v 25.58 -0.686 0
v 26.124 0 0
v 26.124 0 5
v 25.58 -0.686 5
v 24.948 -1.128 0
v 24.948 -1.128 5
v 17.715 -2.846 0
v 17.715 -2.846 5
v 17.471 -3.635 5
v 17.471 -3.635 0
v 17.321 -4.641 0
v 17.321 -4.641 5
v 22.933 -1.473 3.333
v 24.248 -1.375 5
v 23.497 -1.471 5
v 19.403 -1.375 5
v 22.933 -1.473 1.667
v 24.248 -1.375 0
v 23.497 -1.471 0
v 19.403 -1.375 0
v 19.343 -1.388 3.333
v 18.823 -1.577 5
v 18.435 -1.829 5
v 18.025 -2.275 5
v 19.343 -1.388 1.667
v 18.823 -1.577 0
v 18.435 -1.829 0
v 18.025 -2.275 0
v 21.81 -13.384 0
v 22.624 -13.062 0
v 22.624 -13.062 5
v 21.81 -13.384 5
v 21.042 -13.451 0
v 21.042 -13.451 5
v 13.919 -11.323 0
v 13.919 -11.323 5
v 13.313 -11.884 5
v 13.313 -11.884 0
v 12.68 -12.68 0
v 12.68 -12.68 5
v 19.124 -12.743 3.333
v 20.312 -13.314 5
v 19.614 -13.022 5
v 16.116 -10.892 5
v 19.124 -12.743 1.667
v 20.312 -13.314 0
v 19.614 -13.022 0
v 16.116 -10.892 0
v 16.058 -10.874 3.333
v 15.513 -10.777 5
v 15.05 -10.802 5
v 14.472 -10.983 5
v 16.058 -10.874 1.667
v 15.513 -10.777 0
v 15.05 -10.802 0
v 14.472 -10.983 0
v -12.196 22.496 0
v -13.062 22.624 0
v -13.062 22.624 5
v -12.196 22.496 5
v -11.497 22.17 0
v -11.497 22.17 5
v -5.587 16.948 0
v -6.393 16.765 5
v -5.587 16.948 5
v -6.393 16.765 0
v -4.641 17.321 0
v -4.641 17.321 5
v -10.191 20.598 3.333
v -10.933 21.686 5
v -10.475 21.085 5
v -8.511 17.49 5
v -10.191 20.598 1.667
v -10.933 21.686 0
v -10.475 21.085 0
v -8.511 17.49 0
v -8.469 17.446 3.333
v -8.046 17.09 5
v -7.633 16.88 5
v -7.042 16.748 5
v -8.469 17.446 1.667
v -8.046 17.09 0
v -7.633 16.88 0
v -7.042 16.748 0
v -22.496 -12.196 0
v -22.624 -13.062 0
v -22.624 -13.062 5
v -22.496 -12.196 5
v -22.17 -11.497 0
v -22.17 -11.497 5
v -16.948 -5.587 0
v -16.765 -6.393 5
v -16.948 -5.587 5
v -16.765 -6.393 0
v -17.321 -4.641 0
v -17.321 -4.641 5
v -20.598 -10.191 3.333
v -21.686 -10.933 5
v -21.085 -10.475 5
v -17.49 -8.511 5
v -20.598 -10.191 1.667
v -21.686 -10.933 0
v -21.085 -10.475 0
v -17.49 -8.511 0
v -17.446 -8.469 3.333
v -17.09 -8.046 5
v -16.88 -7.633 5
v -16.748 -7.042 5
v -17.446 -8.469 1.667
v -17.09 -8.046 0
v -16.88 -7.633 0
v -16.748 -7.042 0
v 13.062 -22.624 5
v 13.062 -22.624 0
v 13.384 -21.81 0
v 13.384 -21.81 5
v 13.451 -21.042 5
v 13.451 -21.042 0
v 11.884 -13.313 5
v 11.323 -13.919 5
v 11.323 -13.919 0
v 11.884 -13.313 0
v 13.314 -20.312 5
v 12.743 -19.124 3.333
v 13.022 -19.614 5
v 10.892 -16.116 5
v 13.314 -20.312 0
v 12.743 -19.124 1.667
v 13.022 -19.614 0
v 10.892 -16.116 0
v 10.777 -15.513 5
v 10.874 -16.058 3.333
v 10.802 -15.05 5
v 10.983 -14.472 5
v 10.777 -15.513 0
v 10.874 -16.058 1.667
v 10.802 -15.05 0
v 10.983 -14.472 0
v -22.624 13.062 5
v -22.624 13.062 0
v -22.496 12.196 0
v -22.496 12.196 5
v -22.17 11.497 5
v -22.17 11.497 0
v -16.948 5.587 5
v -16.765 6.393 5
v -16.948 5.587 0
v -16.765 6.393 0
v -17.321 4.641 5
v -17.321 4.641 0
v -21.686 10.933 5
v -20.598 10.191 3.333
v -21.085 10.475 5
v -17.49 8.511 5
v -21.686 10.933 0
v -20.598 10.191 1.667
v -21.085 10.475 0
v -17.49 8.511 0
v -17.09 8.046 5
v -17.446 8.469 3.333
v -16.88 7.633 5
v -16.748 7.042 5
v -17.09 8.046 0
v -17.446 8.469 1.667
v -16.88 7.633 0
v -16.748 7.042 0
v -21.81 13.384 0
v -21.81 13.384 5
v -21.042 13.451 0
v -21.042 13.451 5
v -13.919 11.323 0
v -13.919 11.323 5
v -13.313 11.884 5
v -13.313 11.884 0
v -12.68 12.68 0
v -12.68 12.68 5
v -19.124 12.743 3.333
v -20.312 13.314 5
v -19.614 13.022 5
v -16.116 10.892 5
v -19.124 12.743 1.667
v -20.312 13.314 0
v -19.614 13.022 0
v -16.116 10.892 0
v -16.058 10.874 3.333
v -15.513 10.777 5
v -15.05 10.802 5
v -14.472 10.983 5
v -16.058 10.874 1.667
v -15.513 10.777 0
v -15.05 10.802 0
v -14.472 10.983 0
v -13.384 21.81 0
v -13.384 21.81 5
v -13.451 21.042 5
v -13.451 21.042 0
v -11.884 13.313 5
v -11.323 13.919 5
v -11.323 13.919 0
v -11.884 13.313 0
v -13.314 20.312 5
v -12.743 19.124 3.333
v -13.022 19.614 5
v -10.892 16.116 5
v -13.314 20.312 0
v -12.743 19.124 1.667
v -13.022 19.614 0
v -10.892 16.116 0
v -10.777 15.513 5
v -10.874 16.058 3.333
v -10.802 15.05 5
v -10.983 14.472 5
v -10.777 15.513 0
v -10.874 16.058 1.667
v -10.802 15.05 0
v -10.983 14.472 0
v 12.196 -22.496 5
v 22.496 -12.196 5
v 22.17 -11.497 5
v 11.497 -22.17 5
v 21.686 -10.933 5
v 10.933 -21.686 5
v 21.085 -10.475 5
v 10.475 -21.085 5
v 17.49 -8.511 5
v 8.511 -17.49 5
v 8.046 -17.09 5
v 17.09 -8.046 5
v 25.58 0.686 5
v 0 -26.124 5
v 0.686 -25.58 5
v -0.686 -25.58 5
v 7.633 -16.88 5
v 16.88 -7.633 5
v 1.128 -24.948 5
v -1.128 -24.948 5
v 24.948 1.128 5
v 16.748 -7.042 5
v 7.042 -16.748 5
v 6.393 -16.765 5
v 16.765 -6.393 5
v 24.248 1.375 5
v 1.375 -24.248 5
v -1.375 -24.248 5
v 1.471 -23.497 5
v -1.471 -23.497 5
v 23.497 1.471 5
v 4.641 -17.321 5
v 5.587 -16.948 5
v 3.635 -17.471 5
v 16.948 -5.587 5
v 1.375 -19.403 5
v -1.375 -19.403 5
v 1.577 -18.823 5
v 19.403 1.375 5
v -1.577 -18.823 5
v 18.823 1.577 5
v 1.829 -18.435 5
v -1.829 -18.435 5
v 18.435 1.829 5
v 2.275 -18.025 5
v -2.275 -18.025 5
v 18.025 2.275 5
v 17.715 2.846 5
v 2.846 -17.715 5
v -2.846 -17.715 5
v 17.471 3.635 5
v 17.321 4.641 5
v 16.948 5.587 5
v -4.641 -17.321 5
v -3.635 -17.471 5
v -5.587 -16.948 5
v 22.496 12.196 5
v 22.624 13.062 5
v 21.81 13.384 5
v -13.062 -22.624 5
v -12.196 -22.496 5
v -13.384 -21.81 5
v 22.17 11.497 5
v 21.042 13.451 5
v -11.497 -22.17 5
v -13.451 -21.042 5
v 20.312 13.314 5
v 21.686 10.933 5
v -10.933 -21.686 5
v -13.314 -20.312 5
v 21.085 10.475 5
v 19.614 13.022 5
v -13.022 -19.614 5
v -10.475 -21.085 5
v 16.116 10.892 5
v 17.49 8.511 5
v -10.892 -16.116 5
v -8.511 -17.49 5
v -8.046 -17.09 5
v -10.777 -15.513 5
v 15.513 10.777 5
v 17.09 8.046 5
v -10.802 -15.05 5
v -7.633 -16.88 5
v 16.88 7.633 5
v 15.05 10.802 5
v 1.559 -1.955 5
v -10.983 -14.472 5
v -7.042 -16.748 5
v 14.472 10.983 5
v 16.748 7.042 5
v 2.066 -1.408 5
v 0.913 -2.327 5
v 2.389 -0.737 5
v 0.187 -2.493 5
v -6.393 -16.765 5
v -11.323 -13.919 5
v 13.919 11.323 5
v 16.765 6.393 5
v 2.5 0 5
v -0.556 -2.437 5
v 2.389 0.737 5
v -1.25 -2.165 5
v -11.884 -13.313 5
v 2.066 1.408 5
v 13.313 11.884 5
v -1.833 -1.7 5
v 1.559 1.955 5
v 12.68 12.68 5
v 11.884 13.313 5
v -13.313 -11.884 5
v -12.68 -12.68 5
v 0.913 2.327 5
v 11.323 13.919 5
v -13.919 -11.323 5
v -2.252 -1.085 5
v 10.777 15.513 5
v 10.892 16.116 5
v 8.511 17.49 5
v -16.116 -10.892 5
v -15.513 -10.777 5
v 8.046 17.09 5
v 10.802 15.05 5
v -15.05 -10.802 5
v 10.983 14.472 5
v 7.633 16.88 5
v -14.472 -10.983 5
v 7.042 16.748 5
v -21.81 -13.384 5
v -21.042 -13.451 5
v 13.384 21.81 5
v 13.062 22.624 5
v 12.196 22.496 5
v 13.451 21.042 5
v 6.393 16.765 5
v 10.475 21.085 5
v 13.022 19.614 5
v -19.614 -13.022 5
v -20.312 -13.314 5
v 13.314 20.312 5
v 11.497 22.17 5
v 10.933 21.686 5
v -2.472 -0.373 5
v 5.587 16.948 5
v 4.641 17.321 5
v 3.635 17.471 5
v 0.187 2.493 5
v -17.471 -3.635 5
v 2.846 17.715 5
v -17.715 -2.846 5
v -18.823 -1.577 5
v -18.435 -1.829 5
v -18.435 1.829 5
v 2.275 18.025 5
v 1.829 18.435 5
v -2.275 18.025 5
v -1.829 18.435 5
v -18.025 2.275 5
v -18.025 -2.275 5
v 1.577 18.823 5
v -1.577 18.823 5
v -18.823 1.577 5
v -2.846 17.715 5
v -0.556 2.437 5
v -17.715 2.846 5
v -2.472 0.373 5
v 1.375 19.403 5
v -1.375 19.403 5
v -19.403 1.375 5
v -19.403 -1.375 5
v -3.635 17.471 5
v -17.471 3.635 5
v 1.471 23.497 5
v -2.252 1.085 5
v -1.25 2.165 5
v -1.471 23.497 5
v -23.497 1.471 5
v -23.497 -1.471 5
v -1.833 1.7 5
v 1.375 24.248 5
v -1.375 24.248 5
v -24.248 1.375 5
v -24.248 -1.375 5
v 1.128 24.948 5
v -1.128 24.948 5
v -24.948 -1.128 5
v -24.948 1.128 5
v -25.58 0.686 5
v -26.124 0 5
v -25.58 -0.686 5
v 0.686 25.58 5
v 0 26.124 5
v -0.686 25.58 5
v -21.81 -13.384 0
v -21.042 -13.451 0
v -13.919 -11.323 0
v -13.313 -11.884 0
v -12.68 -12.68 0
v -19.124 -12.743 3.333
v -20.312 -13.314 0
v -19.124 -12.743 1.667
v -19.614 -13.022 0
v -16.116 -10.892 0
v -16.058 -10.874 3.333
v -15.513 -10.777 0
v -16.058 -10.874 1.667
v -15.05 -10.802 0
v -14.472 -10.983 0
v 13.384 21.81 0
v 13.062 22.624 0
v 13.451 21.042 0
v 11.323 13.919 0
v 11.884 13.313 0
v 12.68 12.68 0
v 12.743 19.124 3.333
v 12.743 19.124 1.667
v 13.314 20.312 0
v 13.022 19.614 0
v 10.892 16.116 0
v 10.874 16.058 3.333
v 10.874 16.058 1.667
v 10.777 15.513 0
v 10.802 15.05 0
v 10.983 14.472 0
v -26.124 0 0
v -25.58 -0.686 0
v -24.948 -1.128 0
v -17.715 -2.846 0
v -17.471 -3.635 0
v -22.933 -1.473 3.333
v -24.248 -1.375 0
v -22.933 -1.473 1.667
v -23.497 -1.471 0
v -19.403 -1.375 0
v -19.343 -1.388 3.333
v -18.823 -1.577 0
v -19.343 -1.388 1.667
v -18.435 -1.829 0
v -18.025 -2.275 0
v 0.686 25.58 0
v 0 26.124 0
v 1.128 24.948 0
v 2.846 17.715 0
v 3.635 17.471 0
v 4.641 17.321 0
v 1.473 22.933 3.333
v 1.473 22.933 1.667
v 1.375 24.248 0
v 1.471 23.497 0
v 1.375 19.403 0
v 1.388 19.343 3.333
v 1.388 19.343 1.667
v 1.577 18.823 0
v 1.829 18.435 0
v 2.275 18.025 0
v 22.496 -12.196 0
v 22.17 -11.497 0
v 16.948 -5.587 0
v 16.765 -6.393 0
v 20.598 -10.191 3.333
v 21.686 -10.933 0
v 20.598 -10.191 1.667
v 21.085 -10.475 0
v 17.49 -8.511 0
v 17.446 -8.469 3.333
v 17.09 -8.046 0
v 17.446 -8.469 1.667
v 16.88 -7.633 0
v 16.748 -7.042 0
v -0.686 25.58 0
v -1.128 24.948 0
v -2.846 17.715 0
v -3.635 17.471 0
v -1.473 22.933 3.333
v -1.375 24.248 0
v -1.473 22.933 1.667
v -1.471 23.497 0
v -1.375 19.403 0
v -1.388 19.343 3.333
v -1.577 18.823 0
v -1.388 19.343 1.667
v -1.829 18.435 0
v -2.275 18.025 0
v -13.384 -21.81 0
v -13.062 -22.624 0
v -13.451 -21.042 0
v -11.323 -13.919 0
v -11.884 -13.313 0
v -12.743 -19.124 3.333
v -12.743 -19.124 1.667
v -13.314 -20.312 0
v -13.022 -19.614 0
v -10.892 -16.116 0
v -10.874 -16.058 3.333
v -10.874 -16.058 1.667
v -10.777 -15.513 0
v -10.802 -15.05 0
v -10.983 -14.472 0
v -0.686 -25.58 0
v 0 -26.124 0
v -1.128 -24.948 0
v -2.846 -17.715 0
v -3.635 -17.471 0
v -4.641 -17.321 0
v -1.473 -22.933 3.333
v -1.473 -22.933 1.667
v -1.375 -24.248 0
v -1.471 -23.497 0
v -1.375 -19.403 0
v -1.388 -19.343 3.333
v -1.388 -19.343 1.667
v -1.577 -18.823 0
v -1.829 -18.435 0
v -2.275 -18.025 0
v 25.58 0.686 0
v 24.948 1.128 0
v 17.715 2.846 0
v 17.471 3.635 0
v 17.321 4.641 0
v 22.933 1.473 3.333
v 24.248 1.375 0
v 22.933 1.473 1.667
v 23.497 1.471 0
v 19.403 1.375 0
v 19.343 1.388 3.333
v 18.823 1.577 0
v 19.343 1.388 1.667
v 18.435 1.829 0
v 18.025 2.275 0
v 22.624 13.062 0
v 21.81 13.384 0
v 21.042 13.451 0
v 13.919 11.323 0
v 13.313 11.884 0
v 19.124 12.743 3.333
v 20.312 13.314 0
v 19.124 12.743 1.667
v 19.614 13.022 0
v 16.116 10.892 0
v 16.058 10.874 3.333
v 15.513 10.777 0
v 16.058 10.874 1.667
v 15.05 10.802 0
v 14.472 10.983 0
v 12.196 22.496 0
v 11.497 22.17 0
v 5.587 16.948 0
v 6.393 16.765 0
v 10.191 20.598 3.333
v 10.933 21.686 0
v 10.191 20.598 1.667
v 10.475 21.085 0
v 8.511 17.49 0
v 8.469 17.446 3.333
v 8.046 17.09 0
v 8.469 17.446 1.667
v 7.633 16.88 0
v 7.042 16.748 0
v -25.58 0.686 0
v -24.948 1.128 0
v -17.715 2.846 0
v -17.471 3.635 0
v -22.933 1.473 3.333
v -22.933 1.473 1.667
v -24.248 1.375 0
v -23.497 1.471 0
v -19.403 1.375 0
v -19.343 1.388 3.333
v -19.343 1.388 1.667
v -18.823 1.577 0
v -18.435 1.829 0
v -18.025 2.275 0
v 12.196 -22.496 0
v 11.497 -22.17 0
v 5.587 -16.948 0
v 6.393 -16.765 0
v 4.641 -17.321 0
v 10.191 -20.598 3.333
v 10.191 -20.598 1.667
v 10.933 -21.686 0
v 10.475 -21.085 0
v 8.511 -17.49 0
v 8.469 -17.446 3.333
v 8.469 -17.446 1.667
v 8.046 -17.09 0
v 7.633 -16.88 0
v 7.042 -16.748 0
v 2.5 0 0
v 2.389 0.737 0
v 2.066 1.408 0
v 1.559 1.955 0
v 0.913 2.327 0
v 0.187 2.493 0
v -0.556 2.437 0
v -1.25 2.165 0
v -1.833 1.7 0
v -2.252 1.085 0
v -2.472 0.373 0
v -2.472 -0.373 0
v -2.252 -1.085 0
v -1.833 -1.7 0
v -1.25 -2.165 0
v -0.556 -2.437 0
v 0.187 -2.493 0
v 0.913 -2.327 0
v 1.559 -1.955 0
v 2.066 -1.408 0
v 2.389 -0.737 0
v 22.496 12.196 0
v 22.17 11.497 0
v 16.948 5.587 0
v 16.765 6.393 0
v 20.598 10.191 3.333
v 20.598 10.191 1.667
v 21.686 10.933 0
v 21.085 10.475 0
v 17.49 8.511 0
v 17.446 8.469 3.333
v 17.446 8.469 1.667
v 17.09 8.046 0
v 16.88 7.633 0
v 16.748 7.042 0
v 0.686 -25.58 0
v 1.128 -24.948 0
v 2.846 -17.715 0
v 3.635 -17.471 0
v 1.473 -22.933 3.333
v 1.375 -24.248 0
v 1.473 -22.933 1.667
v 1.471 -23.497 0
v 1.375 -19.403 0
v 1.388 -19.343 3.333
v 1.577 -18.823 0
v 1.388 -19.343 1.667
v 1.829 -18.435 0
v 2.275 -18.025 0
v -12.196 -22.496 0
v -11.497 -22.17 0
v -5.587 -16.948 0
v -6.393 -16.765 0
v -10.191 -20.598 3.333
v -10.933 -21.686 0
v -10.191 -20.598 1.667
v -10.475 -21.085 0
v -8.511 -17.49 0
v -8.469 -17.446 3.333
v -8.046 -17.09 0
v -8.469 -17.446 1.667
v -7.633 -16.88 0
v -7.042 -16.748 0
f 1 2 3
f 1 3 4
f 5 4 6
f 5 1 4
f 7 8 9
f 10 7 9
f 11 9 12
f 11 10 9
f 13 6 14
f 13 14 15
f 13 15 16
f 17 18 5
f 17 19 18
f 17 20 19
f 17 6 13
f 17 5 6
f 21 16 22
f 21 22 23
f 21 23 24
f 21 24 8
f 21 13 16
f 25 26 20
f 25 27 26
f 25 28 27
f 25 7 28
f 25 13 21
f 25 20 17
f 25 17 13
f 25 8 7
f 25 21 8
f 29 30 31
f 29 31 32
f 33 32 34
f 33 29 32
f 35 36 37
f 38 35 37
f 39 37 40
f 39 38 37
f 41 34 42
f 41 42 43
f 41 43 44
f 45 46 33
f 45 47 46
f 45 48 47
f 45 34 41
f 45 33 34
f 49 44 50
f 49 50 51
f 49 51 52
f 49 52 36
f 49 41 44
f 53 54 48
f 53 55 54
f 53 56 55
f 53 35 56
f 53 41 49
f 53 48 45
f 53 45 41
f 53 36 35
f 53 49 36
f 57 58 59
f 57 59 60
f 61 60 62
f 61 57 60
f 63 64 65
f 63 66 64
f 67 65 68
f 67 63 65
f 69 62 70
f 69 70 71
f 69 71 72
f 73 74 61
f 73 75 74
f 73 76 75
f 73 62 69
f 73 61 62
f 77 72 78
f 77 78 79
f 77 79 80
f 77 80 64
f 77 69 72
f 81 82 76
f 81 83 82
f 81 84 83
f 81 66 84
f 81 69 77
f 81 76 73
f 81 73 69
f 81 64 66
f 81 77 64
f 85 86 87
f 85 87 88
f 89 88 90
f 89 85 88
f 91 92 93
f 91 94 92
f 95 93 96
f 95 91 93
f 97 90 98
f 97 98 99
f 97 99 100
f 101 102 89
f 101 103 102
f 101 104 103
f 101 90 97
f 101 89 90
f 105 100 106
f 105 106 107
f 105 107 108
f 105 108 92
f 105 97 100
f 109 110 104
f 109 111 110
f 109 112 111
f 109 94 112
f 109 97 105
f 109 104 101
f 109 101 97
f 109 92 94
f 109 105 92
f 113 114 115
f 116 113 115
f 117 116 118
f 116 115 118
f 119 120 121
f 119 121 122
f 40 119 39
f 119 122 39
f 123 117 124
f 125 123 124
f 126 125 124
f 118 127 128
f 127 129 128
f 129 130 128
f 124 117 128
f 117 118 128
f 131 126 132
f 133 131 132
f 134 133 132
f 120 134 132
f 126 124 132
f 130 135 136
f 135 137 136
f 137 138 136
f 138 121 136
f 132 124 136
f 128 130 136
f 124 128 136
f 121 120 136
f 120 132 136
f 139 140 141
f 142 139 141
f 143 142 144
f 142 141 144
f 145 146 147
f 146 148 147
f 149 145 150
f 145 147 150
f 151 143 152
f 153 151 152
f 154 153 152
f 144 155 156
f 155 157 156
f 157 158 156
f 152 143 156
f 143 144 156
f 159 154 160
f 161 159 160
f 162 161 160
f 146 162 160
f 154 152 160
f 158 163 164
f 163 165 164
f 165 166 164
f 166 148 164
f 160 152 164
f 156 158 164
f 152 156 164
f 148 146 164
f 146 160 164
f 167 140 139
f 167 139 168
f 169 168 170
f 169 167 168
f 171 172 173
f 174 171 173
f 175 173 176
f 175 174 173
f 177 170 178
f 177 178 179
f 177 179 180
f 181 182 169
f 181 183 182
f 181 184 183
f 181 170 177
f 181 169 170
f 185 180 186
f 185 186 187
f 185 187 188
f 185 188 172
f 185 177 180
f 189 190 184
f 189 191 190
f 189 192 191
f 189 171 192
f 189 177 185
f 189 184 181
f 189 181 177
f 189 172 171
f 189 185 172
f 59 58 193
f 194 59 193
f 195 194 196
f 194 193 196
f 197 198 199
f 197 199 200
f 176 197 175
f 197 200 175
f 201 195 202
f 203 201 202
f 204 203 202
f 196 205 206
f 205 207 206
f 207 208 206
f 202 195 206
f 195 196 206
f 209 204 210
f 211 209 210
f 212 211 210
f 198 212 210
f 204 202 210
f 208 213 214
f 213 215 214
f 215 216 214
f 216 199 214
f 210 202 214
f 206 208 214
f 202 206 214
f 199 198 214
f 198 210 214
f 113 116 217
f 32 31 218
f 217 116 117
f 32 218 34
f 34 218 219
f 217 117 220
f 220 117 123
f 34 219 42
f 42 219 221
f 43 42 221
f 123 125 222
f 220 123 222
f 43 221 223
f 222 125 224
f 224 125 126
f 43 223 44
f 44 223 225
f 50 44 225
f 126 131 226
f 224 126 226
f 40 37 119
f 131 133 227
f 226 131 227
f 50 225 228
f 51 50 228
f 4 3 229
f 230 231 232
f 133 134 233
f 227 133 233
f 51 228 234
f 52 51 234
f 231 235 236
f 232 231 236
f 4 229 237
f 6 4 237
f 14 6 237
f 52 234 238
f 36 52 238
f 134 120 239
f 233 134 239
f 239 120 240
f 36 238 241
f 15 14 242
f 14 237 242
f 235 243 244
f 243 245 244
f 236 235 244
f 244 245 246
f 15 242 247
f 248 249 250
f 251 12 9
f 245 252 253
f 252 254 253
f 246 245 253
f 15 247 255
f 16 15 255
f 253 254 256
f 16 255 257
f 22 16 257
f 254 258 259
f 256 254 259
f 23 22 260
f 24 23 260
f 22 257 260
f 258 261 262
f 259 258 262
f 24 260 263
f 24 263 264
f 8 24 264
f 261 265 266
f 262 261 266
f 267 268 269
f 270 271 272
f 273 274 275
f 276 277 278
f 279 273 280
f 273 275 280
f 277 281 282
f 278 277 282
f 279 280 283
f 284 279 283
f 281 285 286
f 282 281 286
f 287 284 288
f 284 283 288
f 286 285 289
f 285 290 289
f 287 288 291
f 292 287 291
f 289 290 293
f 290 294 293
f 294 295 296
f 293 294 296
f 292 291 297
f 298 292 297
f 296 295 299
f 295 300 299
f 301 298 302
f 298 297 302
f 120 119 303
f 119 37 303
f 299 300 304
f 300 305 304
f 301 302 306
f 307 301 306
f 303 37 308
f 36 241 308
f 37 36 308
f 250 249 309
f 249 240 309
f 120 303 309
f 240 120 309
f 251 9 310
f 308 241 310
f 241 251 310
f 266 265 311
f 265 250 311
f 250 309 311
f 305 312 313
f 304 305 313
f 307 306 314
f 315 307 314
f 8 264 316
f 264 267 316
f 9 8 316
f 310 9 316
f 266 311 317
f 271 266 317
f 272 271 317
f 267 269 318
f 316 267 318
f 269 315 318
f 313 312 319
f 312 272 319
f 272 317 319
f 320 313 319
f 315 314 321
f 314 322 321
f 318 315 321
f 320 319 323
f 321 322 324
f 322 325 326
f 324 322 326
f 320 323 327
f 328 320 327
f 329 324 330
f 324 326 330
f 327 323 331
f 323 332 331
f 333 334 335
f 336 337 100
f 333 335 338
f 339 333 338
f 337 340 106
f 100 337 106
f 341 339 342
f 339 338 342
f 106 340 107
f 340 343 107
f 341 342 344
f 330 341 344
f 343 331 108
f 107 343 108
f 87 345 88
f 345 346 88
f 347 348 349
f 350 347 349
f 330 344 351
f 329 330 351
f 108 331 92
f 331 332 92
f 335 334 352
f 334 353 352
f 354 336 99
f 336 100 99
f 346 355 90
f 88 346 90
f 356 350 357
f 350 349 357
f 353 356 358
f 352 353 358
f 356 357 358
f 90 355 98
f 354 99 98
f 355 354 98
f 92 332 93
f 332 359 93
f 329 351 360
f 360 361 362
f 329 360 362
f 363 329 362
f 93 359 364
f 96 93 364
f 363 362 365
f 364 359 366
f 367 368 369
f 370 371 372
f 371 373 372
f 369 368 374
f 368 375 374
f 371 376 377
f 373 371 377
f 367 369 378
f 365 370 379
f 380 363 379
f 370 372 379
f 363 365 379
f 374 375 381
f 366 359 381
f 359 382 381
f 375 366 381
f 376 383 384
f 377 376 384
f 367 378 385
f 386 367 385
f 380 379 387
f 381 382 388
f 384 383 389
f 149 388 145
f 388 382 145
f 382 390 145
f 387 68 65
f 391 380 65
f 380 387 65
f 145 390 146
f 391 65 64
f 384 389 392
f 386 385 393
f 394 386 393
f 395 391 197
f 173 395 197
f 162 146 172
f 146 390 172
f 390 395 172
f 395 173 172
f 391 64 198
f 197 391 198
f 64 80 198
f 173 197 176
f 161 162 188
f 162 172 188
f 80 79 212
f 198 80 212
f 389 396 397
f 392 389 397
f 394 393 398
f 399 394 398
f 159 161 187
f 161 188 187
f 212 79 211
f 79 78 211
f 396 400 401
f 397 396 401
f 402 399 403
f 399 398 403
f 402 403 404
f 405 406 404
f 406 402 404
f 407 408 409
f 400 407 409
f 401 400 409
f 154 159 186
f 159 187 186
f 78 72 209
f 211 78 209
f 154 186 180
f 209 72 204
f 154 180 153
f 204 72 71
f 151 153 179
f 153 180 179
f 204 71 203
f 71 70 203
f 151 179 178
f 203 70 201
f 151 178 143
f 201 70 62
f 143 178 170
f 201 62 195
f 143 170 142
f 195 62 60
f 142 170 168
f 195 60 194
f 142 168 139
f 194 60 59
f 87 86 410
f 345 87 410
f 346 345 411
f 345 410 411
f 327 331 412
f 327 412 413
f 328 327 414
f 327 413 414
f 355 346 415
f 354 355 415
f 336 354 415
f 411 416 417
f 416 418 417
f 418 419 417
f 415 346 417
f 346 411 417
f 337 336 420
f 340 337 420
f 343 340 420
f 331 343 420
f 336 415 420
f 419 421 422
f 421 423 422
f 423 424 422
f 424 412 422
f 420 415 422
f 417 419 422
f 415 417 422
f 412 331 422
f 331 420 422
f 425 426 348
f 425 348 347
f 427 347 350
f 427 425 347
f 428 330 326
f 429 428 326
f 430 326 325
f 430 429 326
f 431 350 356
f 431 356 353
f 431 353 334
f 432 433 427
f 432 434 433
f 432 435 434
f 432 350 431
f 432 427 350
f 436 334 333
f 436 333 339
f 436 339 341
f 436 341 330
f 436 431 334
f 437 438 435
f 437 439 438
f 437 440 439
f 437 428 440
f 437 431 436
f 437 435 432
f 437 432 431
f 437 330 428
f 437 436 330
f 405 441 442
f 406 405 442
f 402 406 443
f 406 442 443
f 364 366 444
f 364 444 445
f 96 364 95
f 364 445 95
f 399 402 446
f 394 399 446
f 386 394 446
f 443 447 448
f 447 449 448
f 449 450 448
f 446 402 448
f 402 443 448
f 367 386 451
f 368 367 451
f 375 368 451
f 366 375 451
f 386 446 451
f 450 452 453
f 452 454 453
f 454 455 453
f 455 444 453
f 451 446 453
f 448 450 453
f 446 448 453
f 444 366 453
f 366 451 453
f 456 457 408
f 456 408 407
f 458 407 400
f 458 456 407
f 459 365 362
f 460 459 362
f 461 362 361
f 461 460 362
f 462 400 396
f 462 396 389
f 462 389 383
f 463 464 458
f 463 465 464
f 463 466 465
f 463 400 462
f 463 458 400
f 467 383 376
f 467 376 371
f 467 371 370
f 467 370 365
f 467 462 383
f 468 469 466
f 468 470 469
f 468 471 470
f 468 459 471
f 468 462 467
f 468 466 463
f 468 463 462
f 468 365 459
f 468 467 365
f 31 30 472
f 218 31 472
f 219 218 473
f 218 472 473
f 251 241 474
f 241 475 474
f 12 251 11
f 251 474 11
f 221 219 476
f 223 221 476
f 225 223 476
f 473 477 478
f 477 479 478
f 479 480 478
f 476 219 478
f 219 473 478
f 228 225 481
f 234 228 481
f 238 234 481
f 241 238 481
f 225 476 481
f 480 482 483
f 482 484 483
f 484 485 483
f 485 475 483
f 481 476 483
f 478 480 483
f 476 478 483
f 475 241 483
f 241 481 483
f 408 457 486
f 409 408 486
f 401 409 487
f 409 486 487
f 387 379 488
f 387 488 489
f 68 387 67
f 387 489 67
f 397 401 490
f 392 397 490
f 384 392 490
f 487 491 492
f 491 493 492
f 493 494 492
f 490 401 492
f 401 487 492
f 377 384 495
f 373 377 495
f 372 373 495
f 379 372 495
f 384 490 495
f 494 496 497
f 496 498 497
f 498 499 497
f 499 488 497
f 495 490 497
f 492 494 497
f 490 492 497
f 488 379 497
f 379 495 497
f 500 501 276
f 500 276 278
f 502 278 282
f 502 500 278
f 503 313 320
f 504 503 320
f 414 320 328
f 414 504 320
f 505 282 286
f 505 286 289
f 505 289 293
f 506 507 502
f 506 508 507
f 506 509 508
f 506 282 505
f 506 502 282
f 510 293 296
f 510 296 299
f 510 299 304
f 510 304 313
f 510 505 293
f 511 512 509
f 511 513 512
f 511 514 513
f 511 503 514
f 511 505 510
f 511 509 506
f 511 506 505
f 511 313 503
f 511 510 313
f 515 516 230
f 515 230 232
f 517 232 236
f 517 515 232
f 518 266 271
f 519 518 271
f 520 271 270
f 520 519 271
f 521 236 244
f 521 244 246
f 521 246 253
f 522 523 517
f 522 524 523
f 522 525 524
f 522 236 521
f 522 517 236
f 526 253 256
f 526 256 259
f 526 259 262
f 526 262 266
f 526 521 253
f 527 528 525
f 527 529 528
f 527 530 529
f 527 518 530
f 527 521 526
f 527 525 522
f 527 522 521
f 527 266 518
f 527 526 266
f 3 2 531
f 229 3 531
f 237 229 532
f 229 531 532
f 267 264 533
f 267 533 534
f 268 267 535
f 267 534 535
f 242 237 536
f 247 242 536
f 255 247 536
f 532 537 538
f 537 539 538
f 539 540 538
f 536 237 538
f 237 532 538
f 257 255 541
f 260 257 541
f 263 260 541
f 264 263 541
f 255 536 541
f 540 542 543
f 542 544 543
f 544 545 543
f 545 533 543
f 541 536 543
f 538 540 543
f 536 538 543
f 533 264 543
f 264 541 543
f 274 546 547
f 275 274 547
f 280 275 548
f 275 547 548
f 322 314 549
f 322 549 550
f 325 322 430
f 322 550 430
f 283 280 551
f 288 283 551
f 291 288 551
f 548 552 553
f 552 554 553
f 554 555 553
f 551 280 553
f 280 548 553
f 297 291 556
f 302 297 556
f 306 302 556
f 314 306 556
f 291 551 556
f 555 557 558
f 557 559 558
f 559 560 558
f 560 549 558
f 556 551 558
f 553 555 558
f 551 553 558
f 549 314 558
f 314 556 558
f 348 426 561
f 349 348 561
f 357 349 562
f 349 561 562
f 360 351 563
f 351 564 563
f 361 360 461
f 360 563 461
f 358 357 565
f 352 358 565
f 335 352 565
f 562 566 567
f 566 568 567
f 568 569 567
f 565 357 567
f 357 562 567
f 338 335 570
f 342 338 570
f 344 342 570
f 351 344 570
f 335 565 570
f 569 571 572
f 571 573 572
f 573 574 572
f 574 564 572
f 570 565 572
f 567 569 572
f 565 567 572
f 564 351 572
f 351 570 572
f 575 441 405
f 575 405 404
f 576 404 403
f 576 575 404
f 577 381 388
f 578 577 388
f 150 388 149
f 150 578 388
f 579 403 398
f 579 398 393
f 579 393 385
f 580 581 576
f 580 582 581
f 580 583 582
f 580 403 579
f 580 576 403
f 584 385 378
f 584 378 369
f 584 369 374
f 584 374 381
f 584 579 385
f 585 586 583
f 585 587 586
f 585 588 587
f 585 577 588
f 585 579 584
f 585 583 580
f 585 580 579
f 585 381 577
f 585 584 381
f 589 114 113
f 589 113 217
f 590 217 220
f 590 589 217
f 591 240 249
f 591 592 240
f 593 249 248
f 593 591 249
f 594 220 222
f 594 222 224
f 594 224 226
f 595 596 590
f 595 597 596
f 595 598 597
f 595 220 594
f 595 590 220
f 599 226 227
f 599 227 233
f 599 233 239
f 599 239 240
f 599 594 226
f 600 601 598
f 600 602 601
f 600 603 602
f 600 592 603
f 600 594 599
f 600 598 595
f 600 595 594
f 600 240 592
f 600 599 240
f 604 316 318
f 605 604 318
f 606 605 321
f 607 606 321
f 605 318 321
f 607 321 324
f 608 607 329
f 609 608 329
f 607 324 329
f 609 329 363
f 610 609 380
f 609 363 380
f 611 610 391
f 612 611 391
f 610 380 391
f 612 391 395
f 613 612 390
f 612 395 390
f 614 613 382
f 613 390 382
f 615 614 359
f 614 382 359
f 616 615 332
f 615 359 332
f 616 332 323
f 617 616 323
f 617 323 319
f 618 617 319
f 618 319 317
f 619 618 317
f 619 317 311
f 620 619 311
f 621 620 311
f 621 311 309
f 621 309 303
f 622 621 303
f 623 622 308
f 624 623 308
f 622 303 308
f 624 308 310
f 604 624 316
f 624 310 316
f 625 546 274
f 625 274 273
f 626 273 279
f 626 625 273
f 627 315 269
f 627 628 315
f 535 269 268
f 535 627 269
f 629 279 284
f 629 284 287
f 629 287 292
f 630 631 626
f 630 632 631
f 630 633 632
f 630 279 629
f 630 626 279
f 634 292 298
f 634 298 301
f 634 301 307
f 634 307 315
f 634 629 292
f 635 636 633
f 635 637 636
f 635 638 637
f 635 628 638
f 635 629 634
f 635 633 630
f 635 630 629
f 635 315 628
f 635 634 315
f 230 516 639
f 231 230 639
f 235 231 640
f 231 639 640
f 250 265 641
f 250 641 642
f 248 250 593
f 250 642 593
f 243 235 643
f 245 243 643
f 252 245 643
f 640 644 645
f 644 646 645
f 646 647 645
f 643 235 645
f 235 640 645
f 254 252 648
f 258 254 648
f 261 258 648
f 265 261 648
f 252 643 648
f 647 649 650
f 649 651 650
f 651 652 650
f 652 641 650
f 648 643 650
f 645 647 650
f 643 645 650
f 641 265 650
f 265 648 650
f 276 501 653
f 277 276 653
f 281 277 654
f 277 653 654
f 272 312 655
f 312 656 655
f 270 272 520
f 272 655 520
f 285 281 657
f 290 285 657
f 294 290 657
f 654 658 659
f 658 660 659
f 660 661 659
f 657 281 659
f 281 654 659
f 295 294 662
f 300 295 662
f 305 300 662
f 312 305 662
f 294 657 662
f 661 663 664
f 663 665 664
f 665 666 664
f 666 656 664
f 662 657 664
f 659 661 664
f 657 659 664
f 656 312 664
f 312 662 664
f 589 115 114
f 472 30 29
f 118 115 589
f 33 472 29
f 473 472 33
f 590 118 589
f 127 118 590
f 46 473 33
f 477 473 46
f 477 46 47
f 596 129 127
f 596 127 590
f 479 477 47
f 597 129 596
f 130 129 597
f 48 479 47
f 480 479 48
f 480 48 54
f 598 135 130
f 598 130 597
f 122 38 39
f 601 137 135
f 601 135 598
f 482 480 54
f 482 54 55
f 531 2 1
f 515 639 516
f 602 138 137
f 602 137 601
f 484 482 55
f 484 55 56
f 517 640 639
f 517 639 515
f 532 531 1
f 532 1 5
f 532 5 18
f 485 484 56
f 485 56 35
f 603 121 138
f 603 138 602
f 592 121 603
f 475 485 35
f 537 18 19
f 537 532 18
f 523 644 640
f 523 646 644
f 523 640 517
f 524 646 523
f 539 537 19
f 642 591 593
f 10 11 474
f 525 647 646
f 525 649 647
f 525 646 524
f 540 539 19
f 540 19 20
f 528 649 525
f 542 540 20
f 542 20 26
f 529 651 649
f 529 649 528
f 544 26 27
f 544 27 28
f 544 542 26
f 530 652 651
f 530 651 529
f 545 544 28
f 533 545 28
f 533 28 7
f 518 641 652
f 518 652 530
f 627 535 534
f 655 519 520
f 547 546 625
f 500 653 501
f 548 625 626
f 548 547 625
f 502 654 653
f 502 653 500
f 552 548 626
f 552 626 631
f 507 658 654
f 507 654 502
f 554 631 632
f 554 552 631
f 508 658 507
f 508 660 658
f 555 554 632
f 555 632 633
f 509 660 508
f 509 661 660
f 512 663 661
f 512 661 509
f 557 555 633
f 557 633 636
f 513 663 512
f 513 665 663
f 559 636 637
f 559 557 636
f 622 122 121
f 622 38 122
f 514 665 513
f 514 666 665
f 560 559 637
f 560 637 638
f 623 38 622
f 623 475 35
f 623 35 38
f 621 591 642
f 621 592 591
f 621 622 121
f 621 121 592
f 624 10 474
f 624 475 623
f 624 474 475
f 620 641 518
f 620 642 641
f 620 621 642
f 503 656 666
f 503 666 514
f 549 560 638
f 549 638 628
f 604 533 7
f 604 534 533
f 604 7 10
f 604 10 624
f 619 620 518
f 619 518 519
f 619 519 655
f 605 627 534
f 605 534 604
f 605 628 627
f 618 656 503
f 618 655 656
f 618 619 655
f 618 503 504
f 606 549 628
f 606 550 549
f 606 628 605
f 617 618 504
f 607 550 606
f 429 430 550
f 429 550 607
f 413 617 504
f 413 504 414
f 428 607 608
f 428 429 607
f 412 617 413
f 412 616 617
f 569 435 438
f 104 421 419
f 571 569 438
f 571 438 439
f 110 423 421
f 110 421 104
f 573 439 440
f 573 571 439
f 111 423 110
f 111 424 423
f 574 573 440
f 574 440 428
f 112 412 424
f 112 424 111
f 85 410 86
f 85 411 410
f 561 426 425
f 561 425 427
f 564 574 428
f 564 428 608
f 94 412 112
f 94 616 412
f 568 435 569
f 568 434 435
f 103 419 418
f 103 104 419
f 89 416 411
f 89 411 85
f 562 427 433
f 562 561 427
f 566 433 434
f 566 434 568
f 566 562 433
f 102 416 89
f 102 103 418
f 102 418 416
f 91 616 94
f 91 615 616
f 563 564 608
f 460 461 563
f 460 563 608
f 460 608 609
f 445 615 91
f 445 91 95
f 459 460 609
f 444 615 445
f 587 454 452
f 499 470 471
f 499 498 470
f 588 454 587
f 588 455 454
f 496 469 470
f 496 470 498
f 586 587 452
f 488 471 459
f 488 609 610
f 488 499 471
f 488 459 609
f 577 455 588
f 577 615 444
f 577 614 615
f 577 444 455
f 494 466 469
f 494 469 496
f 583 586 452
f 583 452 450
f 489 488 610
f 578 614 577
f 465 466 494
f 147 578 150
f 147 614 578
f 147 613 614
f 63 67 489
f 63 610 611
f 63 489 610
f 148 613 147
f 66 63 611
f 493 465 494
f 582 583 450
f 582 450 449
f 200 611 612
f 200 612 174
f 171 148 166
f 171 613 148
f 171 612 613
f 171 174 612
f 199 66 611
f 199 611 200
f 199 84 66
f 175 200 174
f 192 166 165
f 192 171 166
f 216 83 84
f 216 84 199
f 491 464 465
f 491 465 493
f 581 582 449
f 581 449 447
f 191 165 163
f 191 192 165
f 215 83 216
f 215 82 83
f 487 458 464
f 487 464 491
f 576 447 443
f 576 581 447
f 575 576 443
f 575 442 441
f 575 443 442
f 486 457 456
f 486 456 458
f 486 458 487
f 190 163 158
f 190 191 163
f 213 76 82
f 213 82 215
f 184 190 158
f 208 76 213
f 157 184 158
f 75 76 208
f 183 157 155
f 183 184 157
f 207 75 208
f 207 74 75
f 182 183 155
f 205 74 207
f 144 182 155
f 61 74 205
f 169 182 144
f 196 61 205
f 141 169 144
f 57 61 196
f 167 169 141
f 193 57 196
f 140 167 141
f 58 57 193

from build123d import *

# Parameters (mm, degrees)
BOSS_EXTRUDE4_DEPTH = 5
SKETCH10_R          = 2.5
CUT_EXTRUDE3_DEPTH  = 5


with BuildPart() as part:
    # Sketch9 → Boss-Extrude4 (new body)
    with BuildSketch(Plane.XY):
        with BuildLine():
            add(Edge.make_bspline(
                [(0, 26.124355653), (3.884864274, 23.788582221), (-1.912523876, 17.903903592), (4.641256317, 17.321404385)],
                knots=[0, 0, 0, 0, 1, 1, 1, 1], degree=3))
            add(Edge.make_bspline(
                [(13.062177826, 22.624355653), (8.529899959, 22.54394866), (10.608246058, 14.5489734), (4.641256317, 17.321404385)],
                knots=[0, 0, 0, 0, 1, 1, 1, 1], degree=3))
            add(Edge.make_bspline(
                [(13.062177826, 22.624355653), (15.258682262, 18.659084387), (7.295657534, 16.461497276), (12.680148068, 12.680148068)],
                knots=[0, 0, 0, 0, 1, 1, 1, 1], degree=3))
            add(Edge.make_bspline(
                [(22.624355653, 13.062177826), (18.659084387, 15.258682262), (16.461497276, 7.295657534), (12.680148068, 12.680148068)],
                knots=[0, 0, 0, 0, 1, 1, 1, 1], degree=3))
            add(Edge.make_bspline(
                [(22.624355653, 13.062177826), (22.54394866, 8.529899959), (14.5489734, 10.608246058), (17.321404385, 4.641256317)],
                knots=[0, 0, 0, 0, 1, 1, 1, 1], degree=3))
            add(Edge.make_bspline(
                [(26.124355653, 0), (23.788582221, 3.884864274), (17.903903592, -1.912523876), (17.321404385, 4.641256317)],
                knots=[0, 0, 0, 0, 1, 1, 1, 1], degree=3))
            add(Edge.make_bspline(
                [(26.124355653, 0), (23.788582221, -3.884864274), (17.903903592, 1.912523876), (17.321404385, -4.641256317)],
                knots=[0, 0, 0, 0, 1, 1, 1, 1], degree=3))
            add(Edge.make_bspline(
                [(22.624355653, -13.062177826), (22.54394866, -8.529899959), (14.5489734, -10.608246058), (17.321404385, -4.641256317)],
                knots=[0, 0, 0, 0, 1, 1, 1, 1], degree=3))
            add(Edge.make_bspline(
                [(22.624355653, -13.062177826), (18.659084387, -15.258682262), (16.461497276, -7.295657534), (12.680148068, -12.680148068)],
                knots=[0, 0, 0, 0, 1, 1, 1, 1], degree=3))
            add(Edge.make_bspline(
                [(13.062177826, -22.624355653), (15.258682262, -18.659084387), (7.295657534, -16.461497276), (12.680148068, -12.680148068)],
                knots=[0, 0, 0, 0, 1, 1, 1, 1], degree=3))
            add(Edge.make_bspline(
                [(13.062177826, -22.624355653), (8.529899959, -22.54394866), (10.608246058, -14.5489734), (4.641256317, -17.321404385)],
                knots=[0, 0, 0, 0, 1, 1, 1, 1], degree=3))
            add(Edge.make_bspline(
                [(0, -26.124355653), (3.884864274, -23.788582221), (-1.912523876, -17.903903592), (4.641256317, -17.321404385)],
                knots=[0, 0, 0, 0, 1, 1, 1, 1], degree=3))
            add(Edge.make_bspline(
                [(0, -26.124355653), (-3.884864274, -23.788582221), (1.912523876, -17.903903592), (-4.641256317, -17.321404385)],
                knots=[0, 0, 0, 0, 1, 1, 1, 1], degree=3))
            add(Edge.make_bspline(
                [(-13.062177826, -22.624355653), (-8.529899959, -22.54394866), (-10.608246058, -14.5489734), (-4.641256317, -17.321404385)],
                knots=[0, 0, 0, 0, 1, 1, 1, 1], degree=3))
            add(Edge.make_bspline(
                [(-13.062177826, -22.624355653), (-15.258682262, -18.659084387), (-7.295657534, -16.461497276), (-12.680148068, -12.680148068)],
                knots=[0, 0, 0, 0, 1, 1, 1, 1], degree=3))
            add(Edge.make_bspline(
                [(-22.624355653, -13.062177826), (-18.659084387, -15.258682262), (-16.461497276, -7.295657534), (-12.680148068, -12.680148068)],
                knots=[0, 0, 0, 0, 1, 1, 1, 1], degree=3))
            add(Edge.make_bspline(
                [(-22.624355653, -13.062177826), (-22.54394866, -8.529899959), (-14.5489734, -10.608246058), (-17.321404385, -4.641256317)],
                knots=[0, 0, 0, 0, 1, 1, 1, 1], degree=3))
            add(Edge.make_bspline(
                [(-26.124355653, 0), (-23.788582221, -3.884864274), (-17.903903592, 1.912523876), (-17.321404385, -4.641256317)],
                knots=[0, 0, 0, 0, 1, 1, 1, 1], degree=3))
            add(Edge.make_bspline(
                [(-26.124355653, 0), (-23.788582221, 3.884864274), (-17.903903592, -1.912523876), (-17.321404385, 4.641256317)],
                knots=[0, 0, 0, 0, 1, 1, 1, 1], degree=3))
            add(Edge.make_bspline(
                [(-22.624355653, 13.062177826), (-22.54394866, 8.529899959), (-14.5489734, 10.608246058), (-17.321404385, 4.641256317)],
                knots=[0, 0, 0, 0, 1, 1, 1, 1], degree=3))
            add(Edge.make_bspline(
                [(-22.624355653, 13.062177826), (-18.659084387, 15.258682262), (-16.461497276, 7.295657534), (-12.680148068, 12.680148068)],
                knots=[0, 0, 0, 0, 1, 1, 1, 1], degree=3))
            add(Edge.make_bspline(
                [(-13.062177826, 22.624355653), (-15.258682262, 18.659084387), (-7.295657534, 16.461497276), (-12.680148068, 12.680148068)],
                knots=[0, 0, 0, 0, 1, 1, 1, 1], degree=3))
            add(Edge.make_bspline(
                [(-13.062177826, 22.624355653), (-8.529899959, 22.54394866), (-10.608246058, 14.5489734), (-4.641256317, 17.321404385)],
                knots=[0, 0, 0, 0, 1, 1, 1, 1], degree=3))
            add(Edge.make_bspline(
                [(0, 26.124355653), (-3.884864274, 23.788582221), (1.912523876, 17.903903592), (-4.641256317, 17.321404385)],
                knots=[0, 0, 0, 0, 1, 1, 1, 1], degree=3))
        make_face()
    extrude(amount=BOSS_EXTRUDE4_DEPTH)

    # Sketch10 → Cut-Extrude3 (cut)
    with BuildSketch(Plane.XY.offset(5)):
        Circle(SKETCH10_R)
    extrude(amount=-CUT_EXTRUDE3_DEPTH, mode=Mode.SUBTRACT)


solid = part.part
